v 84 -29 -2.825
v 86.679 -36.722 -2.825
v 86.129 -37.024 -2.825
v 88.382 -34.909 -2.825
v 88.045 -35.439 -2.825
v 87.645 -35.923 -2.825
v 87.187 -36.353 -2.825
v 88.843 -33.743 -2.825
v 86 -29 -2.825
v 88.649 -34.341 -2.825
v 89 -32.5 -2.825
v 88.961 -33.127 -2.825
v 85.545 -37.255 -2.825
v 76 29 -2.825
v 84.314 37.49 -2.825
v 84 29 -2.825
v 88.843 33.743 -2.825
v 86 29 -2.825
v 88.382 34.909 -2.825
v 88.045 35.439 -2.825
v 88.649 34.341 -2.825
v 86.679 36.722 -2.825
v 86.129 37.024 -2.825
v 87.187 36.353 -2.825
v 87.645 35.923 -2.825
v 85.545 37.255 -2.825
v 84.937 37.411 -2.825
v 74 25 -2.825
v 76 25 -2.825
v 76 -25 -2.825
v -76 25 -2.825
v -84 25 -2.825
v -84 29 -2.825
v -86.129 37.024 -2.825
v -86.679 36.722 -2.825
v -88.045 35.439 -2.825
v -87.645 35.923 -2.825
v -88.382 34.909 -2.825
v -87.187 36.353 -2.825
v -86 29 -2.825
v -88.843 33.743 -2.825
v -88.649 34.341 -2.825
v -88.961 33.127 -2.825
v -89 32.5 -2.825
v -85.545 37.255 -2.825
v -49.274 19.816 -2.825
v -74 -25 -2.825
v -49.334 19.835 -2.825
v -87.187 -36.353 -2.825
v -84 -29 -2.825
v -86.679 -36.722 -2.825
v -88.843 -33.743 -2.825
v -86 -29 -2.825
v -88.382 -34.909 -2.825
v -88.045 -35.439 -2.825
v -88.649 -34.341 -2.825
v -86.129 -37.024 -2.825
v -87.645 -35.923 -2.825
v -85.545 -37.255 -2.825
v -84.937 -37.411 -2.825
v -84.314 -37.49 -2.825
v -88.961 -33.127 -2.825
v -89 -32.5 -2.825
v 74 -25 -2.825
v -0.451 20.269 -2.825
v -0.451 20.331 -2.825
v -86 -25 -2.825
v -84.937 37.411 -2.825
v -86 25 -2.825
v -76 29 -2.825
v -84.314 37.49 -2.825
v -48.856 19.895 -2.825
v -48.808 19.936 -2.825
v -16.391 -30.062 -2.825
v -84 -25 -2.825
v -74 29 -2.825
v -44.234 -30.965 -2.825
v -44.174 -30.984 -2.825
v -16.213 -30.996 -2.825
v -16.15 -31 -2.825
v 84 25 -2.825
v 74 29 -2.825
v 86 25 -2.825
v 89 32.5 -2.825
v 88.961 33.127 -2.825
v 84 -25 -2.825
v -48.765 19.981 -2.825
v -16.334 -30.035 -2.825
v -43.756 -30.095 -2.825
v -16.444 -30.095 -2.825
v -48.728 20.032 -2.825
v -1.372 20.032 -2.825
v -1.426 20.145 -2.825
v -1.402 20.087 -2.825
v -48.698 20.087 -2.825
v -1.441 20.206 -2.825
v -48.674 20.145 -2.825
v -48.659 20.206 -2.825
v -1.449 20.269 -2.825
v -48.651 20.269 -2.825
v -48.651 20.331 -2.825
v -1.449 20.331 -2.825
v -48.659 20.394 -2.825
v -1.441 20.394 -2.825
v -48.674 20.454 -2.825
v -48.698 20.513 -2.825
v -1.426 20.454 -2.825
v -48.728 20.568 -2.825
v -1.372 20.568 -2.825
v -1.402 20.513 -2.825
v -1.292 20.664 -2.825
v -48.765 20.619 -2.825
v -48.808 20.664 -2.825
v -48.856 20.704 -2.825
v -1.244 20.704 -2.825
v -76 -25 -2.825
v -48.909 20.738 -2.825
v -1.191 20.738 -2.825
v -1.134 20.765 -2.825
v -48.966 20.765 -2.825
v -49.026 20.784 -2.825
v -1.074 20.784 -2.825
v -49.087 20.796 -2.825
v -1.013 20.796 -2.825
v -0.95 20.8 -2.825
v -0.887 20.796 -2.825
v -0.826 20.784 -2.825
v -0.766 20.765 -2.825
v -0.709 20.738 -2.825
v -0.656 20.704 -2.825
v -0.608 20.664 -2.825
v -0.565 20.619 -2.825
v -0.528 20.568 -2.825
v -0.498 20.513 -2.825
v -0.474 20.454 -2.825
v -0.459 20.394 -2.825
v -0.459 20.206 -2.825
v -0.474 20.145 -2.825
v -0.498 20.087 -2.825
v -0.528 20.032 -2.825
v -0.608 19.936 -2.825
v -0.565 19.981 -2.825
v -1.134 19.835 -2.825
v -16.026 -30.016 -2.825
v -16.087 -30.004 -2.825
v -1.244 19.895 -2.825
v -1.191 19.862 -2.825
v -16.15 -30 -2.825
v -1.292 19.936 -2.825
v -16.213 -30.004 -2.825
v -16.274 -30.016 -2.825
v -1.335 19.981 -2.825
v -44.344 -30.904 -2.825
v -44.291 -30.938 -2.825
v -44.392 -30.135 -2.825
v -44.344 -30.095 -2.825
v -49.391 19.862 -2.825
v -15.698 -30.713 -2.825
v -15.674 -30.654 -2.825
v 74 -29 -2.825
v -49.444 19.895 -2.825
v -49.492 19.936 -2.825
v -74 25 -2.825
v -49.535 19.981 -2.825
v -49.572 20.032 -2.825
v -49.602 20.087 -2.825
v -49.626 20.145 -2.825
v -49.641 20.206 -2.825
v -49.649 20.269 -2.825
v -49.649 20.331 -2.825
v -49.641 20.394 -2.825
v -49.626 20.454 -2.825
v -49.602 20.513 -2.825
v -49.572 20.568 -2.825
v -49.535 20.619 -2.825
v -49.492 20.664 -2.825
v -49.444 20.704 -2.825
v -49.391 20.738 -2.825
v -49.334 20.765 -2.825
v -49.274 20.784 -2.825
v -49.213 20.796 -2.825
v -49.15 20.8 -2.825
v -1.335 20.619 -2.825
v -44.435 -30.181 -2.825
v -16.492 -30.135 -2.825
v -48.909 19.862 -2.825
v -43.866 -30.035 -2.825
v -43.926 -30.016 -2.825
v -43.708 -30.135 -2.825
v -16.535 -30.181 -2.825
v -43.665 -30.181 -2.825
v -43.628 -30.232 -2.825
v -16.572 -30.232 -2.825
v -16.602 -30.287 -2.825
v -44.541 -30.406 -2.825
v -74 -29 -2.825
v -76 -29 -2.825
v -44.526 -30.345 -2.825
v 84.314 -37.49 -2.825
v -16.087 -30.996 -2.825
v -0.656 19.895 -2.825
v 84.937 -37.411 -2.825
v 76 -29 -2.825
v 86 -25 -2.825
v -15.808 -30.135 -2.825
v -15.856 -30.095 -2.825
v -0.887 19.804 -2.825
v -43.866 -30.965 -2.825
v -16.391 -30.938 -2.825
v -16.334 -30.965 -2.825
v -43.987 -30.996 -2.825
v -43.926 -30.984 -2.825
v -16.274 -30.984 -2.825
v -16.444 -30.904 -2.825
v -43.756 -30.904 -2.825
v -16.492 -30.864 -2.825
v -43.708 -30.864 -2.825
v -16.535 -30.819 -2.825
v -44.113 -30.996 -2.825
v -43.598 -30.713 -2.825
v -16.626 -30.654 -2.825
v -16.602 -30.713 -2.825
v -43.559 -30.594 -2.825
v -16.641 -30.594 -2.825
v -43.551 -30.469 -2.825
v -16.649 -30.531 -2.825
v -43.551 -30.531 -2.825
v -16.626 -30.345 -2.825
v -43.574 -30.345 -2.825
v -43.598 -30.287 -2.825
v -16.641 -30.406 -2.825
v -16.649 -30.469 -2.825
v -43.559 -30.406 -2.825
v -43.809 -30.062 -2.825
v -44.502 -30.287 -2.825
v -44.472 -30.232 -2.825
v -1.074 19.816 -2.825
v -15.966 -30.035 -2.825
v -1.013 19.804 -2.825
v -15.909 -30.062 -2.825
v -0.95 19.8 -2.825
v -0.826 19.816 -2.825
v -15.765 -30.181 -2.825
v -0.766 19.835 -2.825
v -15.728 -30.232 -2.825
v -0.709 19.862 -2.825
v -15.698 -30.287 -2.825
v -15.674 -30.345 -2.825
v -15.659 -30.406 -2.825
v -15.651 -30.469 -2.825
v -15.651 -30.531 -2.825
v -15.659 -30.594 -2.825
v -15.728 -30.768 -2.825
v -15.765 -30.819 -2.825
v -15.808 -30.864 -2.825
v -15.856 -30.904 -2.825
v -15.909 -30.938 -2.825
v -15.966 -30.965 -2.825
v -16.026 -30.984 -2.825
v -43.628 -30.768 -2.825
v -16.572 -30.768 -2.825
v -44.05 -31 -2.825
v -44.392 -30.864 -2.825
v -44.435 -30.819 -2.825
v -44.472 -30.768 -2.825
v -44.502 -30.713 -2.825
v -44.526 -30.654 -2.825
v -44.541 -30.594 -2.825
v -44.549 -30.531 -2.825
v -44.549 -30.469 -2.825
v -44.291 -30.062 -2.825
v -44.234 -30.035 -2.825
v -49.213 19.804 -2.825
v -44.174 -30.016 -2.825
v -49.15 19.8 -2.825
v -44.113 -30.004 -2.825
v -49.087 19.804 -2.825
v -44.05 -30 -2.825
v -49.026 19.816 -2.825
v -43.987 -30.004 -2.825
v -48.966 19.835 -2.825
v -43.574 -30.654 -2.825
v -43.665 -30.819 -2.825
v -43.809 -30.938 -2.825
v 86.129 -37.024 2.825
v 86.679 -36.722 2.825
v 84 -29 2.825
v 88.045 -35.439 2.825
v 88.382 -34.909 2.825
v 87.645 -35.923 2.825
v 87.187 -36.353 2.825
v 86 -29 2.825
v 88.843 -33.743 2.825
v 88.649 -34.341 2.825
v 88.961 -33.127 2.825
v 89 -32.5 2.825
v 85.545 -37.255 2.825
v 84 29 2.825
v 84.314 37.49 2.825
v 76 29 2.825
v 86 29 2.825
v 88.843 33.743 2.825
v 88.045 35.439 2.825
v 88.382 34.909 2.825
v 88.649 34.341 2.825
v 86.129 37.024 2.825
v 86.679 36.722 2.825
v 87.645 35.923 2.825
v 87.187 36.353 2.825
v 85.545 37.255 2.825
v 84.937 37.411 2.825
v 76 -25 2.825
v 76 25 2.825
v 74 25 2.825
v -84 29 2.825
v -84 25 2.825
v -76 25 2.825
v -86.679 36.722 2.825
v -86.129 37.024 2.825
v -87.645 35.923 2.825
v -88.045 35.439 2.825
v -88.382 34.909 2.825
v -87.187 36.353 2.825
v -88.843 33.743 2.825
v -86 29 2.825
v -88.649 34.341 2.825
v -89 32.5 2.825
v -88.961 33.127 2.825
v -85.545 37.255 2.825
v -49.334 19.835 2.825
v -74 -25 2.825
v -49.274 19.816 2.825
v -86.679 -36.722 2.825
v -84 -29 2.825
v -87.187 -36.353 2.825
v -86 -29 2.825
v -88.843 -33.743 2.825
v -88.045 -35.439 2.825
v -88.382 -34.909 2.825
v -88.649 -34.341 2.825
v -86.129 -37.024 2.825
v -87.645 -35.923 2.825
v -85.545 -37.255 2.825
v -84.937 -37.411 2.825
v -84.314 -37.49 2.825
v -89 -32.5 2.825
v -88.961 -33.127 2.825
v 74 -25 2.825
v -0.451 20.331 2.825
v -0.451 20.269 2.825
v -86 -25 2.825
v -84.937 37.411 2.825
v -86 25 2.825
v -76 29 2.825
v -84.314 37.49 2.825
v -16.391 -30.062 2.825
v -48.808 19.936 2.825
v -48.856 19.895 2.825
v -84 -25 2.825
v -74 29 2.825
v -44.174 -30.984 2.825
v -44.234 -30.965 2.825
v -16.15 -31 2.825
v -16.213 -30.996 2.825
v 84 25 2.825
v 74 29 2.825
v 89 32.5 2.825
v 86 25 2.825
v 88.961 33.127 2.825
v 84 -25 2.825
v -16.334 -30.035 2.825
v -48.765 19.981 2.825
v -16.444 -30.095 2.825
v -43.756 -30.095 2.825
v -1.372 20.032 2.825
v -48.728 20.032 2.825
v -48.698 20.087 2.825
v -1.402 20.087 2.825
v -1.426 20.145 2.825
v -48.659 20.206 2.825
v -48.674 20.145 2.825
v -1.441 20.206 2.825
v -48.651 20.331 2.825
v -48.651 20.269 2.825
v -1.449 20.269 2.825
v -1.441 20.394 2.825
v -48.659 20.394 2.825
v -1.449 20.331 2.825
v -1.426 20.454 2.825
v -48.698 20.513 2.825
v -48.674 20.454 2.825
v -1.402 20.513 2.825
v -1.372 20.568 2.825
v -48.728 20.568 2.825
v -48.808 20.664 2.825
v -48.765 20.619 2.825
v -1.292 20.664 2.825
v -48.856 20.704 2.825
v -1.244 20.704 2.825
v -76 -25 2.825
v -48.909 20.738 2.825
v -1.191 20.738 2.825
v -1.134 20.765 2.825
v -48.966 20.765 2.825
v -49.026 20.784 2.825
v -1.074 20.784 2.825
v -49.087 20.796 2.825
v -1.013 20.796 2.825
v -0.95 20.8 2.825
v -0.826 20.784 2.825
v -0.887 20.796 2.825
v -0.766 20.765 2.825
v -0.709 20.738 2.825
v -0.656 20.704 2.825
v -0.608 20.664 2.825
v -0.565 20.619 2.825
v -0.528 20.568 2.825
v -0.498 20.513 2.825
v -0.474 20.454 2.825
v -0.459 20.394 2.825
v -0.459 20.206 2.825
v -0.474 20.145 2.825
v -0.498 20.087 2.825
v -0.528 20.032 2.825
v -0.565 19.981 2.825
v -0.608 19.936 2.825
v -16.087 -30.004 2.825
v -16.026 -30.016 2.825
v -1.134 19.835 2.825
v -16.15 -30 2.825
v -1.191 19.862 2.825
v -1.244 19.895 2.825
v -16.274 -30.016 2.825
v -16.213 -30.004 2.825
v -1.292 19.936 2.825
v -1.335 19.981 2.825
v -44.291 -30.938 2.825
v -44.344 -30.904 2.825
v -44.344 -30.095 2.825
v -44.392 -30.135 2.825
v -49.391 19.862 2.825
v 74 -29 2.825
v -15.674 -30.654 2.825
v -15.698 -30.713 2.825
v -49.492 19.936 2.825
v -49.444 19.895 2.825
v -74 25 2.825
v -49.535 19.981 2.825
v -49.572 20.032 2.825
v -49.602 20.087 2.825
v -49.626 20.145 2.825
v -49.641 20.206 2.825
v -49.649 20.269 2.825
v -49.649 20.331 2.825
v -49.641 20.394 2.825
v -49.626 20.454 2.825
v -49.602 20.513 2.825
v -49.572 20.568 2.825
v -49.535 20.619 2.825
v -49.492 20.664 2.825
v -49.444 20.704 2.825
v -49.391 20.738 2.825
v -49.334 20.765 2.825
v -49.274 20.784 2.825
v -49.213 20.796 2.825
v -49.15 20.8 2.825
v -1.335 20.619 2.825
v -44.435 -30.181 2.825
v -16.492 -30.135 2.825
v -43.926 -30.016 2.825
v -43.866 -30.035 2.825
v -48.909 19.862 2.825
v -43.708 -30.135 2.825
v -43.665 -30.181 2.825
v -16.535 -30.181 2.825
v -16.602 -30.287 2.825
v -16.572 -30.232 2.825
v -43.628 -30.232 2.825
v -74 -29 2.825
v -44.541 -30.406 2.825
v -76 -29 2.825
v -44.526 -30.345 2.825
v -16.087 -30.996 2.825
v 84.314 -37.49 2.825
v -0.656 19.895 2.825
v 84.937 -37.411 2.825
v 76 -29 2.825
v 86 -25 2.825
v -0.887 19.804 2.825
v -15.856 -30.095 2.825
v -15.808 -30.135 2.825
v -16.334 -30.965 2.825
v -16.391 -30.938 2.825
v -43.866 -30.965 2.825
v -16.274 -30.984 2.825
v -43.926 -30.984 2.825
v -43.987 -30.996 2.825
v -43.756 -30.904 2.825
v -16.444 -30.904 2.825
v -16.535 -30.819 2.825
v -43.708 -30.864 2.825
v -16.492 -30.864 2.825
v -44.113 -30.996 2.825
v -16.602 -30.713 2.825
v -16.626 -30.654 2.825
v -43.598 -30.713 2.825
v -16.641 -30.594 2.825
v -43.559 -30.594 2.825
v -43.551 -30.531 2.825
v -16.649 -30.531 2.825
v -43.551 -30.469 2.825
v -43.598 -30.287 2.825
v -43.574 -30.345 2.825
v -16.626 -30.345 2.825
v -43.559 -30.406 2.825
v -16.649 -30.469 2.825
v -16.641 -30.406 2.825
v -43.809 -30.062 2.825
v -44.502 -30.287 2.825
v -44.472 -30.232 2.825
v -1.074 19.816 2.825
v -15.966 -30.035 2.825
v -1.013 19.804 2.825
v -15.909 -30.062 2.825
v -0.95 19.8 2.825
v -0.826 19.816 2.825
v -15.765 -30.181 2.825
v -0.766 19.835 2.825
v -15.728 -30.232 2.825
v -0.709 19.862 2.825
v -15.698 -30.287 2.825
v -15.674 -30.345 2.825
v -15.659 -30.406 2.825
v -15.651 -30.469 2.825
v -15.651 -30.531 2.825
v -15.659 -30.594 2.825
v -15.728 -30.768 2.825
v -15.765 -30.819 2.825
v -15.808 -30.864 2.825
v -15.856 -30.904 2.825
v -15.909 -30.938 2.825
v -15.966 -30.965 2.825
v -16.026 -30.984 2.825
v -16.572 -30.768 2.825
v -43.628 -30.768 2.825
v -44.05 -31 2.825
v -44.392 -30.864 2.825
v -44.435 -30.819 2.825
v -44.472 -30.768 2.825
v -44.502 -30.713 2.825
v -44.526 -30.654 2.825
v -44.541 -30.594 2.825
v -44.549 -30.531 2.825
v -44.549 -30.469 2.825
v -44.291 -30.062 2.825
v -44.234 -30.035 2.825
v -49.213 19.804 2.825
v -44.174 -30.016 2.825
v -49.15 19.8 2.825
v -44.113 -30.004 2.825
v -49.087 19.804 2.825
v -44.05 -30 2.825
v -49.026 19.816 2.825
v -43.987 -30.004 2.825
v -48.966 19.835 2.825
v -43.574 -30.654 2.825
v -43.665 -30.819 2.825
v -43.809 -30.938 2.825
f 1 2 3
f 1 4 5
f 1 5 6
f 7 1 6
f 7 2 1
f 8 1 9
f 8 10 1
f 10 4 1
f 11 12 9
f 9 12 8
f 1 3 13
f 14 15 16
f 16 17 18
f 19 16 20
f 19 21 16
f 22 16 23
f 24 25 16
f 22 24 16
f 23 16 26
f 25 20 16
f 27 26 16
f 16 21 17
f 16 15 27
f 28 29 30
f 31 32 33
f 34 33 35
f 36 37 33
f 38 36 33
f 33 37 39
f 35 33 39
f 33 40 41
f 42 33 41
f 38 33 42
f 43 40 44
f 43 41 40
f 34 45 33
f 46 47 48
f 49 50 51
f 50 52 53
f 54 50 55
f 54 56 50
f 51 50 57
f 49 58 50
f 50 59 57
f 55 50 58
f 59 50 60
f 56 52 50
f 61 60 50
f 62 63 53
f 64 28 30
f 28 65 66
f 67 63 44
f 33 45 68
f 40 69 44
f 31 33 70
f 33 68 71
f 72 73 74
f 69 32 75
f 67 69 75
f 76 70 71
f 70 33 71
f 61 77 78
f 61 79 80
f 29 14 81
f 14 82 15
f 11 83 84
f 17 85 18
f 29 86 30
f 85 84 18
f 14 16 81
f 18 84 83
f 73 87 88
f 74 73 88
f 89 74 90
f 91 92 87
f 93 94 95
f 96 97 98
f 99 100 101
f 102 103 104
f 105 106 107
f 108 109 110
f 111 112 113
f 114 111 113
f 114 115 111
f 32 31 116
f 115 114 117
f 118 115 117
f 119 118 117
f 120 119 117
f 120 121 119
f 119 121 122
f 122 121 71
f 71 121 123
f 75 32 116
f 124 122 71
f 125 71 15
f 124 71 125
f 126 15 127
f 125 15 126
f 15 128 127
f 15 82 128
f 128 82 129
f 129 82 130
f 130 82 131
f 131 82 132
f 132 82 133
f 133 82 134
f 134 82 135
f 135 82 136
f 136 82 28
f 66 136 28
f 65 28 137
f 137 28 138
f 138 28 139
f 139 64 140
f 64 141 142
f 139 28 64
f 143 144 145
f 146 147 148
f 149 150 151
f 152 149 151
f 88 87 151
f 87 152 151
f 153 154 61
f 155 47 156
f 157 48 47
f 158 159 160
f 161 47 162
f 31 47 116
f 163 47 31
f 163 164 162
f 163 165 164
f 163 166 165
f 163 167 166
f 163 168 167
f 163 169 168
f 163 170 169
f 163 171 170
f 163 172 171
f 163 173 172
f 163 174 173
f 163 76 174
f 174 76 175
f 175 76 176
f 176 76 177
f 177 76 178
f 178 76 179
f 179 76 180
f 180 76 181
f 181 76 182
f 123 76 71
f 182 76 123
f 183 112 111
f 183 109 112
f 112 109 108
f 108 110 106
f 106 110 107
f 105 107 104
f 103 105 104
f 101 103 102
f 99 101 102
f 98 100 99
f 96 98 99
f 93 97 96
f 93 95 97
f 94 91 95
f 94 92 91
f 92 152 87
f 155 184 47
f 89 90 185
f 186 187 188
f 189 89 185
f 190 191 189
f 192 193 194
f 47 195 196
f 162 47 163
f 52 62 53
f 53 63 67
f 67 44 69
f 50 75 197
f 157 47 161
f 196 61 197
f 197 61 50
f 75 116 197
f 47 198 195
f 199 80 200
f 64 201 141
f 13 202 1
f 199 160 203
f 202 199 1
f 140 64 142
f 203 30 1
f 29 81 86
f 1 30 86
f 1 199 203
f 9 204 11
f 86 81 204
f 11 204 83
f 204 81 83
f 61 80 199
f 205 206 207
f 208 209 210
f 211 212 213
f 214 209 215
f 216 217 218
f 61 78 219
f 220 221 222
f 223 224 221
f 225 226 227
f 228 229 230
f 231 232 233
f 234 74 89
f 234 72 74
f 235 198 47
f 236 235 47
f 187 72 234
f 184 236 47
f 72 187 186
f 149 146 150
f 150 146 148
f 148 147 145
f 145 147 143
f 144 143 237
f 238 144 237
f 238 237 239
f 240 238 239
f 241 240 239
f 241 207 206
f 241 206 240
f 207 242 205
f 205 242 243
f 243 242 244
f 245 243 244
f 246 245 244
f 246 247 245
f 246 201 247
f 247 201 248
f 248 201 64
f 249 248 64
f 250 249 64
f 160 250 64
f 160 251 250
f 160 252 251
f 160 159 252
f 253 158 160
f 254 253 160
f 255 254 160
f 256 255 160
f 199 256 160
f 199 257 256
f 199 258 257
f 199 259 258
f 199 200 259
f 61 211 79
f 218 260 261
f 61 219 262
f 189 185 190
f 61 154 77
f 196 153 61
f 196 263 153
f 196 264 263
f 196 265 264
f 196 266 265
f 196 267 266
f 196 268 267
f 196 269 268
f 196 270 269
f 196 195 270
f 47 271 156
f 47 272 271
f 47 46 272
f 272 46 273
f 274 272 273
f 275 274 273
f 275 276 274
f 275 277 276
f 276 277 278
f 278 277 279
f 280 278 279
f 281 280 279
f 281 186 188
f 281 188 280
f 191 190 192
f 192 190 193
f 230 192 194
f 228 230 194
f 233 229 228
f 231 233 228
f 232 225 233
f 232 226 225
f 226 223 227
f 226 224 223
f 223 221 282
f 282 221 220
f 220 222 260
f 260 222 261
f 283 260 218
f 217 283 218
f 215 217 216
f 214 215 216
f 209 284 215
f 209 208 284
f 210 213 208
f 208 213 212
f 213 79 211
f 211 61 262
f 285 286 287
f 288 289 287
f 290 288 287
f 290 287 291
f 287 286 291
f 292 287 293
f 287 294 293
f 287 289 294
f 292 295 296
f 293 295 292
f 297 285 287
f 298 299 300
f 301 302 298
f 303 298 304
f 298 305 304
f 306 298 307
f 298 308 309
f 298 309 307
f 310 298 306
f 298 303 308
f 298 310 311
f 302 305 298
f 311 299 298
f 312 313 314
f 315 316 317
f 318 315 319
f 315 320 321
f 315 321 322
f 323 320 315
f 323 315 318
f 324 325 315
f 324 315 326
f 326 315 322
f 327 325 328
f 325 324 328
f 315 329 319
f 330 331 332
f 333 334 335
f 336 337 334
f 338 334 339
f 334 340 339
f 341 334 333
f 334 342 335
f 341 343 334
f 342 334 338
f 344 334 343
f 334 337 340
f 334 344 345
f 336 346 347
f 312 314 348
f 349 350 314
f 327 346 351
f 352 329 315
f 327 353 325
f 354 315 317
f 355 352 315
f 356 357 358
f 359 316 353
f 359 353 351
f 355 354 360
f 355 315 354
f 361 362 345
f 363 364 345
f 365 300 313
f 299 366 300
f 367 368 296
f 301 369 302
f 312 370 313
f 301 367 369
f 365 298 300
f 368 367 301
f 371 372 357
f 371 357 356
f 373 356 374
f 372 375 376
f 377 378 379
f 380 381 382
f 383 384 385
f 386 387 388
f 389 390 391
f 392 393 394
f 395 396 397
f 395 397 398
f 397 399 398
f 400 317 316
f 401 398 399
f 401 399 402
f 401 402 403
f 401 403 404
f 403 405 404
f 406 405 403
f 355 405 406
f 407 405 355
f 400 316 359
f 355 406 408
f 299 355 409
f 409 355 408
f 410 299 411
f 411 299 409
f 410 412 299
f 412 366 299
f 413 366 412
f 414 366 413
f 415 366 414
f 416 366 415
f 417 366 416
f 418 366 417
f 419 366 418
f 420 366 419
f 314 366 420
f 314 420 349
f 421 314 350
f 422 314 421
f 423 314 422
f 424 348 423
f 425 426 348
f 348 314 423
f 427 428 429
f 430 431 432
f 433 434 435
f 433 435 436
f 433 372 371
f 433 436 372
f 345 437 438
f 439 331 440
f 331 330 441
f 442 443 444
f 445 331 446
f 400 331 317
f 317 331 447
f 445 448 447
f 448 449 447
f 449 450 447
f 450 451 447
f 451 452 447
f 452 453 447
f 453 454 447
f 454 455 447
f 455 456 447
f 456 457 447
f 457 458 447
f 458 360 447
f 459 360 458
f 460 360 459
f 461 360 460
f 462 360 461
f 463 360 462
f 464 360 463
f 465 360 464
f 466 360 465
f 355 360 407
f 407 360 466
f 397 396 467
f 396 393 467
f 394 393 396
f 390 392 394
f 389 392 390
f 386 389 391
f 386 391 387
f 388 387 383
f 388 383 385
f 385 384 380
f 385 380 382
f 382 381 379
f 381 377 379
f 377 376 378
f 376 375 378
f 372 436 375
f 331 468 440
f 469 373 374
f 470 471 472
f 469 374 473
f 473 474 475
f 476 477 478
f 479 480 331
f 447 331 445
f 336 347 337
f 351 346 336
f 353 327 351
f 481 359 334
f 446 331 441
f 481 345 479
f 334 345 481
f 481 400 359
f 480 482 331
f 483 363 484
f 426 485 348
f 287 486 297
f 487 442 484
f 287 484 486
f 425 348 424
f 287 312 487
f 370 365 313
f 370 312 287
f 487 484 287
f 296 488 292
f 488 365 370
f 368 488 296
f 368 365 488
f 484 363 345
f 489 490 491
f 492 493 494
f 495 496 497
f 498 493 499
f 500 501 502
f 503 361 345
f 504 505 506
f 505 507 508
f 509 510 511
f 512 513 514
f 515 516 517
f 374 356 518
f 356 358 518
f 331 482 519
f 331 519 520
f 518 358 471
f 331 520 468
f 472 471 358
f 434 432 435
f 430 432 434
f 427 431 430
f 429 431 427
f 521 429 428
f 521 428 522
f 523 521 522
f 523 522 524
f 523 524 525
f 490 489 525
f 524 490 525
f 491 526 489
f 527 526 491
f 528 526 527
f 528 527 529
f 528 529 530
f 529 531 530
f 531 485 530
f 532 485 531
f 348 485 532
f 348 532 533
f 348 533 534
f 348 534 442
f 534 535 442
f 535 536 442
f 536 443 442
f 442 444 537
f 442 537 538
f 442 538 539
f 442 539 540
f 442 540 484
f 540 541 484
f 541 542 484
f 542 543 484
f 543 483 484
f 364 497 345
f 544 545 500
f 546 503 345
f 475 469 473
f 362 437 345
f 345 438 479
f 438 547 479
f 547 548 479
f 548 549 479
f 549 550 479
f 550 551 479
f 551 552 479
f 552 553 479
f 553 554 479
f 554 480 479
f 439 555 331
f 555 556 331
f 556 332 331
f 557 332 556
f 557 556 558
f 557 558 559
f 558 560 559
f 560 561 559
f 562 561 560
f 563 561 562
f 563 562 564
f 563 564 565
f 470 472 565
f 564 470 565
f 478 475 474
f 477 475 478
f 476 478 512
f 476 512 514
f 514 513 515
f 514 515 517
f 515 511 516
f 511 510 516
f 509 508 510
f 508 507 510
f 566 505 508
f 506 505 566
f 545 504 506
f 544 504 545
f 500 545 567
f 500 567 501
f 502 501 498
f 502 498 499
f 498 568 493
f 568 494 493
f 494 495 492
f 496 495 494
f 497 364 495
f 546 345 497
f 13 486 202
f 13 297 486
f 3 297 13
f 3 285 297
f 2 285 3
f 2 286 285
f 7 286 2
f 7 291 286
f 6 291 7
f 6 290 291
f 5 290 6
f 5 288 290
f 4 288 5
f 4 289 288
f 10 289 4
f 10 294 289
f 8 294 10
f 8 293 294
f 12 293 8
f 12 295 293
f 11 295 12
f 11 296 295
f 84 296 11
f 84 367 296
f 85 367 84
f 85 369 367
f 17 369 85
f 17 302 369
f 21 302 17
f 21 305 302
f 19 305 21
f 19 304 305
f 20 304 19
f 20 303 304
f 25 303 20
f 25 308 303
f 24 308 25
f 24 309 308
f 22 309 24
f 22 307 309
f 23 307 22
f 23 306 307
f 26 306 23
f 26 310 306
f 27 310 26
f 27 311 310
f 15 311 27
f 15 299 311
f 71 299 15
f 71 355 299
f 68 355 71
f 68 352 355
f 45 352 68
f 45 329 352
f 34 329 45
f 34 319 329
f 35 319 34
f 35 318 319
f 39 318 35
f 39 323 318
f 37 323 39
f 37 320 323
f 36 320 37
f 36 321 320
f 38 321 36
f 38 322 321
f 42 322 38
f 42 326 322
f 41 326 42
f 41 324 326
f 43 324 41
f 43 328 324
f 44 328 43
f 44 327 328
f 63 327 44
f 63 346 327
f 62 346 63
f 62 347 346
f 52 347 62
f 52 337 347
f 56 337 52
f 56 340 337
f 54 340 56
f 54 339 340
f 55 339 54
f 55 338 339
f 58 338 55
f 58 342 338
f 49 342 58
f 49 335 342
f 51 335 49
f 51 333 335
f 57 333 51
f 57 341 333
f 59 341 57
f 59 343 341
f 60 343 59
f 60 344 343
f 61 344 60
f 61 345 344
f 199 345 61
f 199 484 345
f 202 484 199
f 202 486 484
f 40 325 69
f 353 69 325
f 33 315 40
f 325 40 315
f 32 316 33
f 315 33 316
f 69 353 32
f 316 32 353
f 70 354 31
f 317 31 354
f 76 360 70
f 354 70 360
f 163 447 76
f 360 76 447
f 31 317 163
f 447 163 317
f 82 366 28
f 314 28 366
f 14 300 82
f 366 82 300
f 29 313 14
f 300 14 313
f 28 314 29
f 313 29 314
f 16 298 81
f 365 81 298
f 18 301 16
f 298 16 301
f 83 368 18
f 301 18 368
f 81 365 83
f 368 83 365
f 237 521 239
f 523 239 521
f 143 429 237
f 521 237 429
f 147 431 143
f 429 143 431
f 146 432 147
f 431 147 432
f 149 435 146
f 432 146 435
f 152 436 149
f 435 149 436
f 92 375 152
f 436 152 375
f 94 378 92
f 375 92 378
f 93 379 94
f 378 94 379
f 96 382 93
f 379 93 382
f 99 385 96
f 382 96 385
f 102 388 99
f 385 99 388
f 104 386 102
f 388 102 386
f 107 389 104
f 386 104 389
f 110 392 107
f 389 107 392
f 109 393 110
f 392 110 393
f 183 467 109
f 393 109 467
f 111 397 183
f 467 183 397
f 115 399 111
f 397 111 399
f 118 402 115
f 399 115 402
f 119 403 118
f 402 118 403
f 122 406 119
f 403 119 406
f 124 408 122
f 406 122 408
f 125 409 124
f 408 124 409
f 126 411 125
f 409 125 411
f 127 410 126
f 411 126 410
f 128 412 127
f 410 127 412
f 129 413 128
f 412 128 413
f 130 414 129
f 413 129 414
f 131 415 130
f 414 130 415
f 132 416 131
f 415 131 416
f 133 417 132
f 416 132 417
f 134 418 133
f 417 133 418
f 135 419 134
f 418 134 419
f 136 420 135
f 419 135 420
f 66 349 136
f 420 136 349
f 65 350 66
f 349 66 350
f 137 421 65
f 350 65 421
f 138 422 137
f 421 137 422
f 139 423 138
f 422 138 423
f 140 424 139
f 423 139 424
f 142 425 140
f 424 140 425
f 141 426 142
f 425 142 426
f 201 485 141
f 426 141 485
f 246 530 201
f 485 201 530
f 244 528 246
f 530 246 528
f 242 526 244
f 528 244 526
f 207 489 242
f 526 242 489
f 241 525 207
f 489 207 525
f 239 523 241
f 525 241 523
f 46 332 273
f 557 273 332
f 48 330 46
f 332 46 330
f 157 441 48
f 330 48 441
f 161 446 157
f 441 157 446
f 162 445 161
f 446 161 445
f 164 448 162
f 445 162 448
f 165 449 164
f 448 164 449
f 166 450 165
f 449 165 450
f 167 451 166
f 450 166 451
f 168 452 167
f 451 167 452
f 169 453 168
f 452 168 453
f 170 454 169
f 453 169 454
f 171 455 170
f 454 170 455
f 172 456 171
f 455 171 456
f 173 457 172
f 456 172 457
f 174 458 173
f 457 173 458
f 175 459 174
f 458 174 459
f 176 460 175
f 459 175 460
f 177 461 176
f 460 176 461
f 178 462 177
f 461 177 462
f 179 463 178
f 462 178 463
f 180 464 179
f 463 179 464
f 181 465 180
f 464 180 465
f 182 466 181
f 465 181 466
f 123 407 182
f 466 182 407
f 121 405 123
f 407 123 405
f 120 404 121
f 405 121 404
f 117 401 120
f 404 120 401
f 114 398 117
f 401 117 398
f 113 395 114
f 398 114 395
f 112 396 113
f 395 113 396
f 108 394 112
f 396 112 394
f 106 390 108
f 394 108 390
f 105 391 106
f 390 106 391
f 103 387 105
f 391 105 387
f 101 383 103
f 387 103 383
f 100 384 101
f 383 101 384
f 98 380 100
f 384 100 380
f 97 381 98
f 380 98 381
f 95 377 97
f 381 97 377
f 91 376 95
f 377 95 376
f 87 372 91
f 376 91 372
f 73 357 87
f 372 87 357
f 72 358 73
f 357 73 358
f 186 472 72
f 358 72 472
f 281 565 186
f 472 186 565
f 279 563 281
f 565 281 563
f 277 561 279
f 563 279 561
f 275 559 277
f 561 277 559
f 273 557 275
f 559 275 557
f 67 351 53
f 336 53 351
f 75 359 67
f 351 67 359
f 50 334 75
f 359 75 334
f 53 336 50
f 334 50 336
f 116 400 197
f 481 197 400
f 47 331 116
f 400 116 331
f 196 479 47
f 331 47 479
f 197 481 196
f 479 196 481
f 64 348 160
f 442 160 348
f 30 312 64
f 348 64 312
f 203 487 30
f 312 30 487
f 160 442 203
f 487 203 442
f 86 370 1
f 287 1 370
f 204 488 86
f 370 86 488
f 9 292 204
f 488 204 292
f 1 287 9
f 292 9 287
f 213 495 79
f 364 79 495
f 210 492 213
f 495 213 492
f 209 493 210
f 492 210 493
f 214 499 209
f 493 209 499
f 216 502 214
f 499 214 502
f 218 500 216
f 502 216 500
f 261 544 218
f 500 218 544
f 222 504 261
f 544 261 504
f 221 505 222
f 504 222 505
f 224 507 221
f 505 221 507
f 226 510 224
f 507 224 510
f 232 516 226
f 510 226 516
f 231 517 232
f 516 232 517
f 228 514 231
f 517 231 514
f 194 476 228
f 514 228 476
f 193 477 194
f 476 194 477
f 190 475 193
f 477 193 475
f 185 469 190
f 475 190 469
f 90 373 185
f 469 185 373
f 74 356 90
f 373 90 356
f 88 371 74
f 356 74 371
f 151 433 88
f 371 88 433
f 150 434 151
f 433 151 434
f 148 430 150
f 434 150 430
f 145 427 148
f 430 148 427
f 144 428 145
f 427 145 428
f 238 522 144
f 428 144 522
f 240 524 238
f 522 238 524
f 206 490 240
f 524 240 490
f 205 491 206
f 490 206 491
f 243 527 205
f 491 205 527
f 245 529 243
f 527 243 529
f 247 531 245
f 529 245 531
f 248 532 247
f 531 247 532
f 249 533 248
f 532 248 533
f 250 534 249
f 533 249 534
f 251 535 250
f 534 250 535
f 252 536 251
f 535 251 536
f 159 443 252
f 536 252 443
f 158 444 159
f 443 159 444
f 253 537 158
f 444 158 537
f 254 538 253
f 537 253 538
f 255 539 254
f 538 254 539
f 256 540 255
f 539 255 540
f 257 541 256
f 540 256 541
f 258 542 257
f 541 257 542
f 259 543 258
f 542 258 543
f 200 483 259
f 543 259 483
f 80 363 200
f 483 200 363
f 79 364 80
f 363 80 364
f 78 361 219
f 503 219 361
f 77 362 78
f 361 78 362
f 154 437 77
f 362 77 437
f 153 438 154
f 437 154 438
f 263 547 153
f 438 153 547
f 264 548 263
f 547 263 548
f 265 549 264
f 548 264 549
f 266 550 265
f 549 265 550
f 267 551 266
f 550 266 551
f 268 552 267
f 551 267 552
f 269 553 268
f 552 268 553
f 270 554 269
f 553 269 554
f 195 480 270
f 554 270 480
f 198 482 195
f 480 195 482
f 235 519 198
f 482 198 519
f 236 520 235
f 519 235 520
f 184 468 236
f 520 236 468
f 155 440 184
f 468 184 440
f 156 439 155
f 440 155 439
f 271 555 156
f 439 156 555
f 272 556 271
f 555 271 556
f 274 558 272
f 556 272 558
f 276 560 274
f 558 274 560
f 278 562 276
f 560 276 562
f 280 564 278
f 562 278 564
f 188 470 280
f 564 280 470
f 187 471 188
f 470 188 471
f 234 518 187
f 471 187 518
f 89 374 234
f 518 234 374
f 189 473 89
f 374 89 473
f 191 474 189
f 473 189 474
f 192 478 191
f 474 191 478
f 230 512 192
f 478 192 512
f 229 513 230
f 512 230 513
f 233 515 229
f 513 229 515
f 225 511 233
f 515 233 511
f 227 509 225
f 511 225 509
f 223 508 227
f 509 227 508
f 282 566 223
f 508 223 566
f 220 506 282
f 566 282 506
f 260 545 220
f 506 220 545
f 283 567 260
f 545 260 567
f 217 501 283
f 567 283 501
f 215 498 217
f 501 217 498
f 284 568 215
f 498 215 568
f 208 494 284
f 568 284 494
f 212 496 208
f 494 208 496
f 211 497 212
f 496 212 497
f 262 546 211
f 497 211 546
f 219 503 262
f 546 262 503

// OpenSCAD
// file: formulas.scad
  
//Distance between 2 points
function distance(p1, p2) = sqrt(pow(p2[0]-p1[0], 2) + pow(p2[1]-p1[1], 2));
  
// distance between 2 arc end points
function arc_distance(r, depth) = sqrt(8*r*depth - 4*pow(depth, 2));
// file: common.scad
include <dimensions.scad>;

module strap_holes(pos=[0,0], rot=0, span=8) {
  translate(pos) rotate([0,0,rot]) {
    translate([0,-span/2]) square(strap_hole_dim, center=true);
    translate([0,span/2]) square(strap_hole_dim, center=true);
  }
}

module nema17_holes(slide) {
  shaft_d = 22;
  screw_d=3;
  s=31;

  module screwhole() {
    hull() {
     translate([-slide/2,0,0]) circle(r=screw_d/2, center=true);
     translate([slide/2,0,0]) circle(h=depth, r=screw_d/2, center=true);
    }
  }

  translate([s/2,s/2,0]) screwhole();
  translate([-s/2,s/2,0]) screwhole();
  translate([s/2,-s/2,0]) screwhole();
  translate([-s/2,-s/2,0]) screwhole();

  circle(r=shaft_d/2, center=true);
}

module endstop(pcb_base=true) {
  // End stop from Sparkfun
  offset=0.2;

  outer=18.6;
  inner=9.9;
  height=15.04;
  inner_height=12.12;
  depth=4.97;
  pcb_width=20.15;
  pcb_length=15.11;
  pcb_thickness=1.56;
  margin=1.6;

  rotate([90, 0, 0]) 
  translate([-outer/2, -(height-inner_height) -offset*3, -depth/2]) {
    color("gray")
    linear_extrude(depth + offset*2)
    offset(0.5)
    difference() {
      square([outer, height]);
      translate([(outer - inner)/2, height - inner_height]) square([inner, inner_height]);
    }
    color("red")
    translate([-(pcb_width-outer)/2, -pcb_thickness, -margin]) cube([pcb_width, pcb_thickness, pcb_length]);
  }


}

endstop();
// file: dimensions.scad
use <formulas.scad>;

$fn=50;
export_fn=100;
export_scale=0.03937; // scales down mm->inches (useful if your laser cutter uses inches)
cut_diam=0.2;

// Global
PI = 3.15159265; 


span_bottle=100; 
bottle_rod_diam=10; 
front_rod_diam=10; 
width=470;
span_bottom=160; // Bottom rods span
span_bottle=120; // Bottle rods span
board_thickness=5.65;
nut_t=6;
back_tilt_angle=20;

cable_diam=1.7;

bushings_diam=15;
bushings_length=24;
bushings_hole_length=24;

strap_hole_dim=[4, 2];
strap_margin=3;

// Bottle grip
grip_margin=11;
bottle_axle_diam=8;
bottle_axle_pos=[span_bottom-sin(back_tilt_angle)*span_bottle/2, cos(back_tilt_angle)*span_bottle/2];

bottle_grip_bottom_diam=90;
bottle_grip_bottom_height=6;
bottle_grip_bottom_cone_height=4;

bottle_grip_top_diam=50;
bottle_grip_top_height=7;
bottle_grip_top_cone_height=20;
bottle_grip_top_diam=50;
bottle_grip_top_inner_diam=45;
bottle_pulley_teeth=62;


// Sides
holes_margin=25; 
axle_position=[0,0];
break_position=[70, 50];
axis_z=40;
bearing_extrusion_height=7.2;
bearing_extrusion_length=24;
bearing_axle_length=20;
bearing_id=8;

//x_top_rod_position=[0,bottle_axle_pos[1] + x_rods_span/2];
bottom_extrusion_height=5;
bottle_top_rod_position=[span_bottom-sin(back_tilt_angle)*span_bottle, cos(back_tilt_angle)*span_bottle];

// Right wall
bottle_axis_diam=15;
stepper_slide_distance=0;
a_stepper_pos=[span_bottom*0.4, 10];
stepper_rotation=0; //atan((bottle_axle_pos[1]-a_stepper_pos[1])/(bottle_axle_pos[0]-a_stepper_pos[0]));


// Left wall

// X table
x_carriage_pos=width/5;
x_a_distance=85;
x_table_tilt=0;
x_rods_span=50;
rod_ext=8;
table_rod_ext=0;
table_rods_diam=8;

// X stepper mount
x_stepper_mount_length = 50;
x_stepper_mount_width = x_rods_span + 10;
x_stepper_mount_shift=(22-9)/2;

x_table_width=width - board_thickness*2;

// X carriage
//carriage_length= 24; // single bushing
carriage_length=65; // double bushings
carriage_height=x_rods_span+20;
carriage_rounding_radius = 5;
carriage_bushing_hole_width = 10;
z_rods_length=120;
z_rods_diam=8;
z_bar_width=20;
z_pos=40;
z_bushings_diam=15;
z_bolt_diam=3;
z_rods_span=41;
z_bushings_pos = x_rods_span/2;
solenoid_dim = [27, 22, 25];
solenoid_pos=0;
plate_distance = sqrt(pow(bushings_diam/2, 2) - pow(carriage_bushing_hole_width/2, 2)) + board_thickness/2; // Calculates plate distance (depending on carriage_bushing_hole_width
echo("Plate distance:", plate_distance*2 + board_thickness);
z_plate_dist = 5;
z_bushings_hole_width = 2*sqrt(pow(bushings_diam/2, 2) - pow(z_plate_dist, 2));
nut_guide_hole_width=10;
nut_guide_hole_length=30;
nut_guide_height=z_plate_dist*2;
nut_guide_width=20;
z_leadscrew_diam=5;
carriage_screw_diam=8;

// Calculations for x table position
xz_span = plate_distance + z_plate_dist + board_thickness/2;
x_top_rod_position=[bottle_axle_pos[0] - cos(x_table_tilt)*(x_a_distance) + sin(x_table_tilt)*(-xz_span), bottle_axle_pos[1] + sin(x_table_tilt)*(x_a_distance) + cos(x_table_tilt)*(-xz_span)];
x_btm_rod_position=[bottle_axle_pos[0] - cos(x_table_tilt)*(x_a_distance + x_rods_span) + sin(x_table_tilt)*(-xz_span), bottle_axle_pos[1] + sin(x_table_tilt)*(x_a_distance + x_rods_span) + cos(x_table_tilt)*(-xz_span)];

toolbit_mount_diam=4.8;

// Bottle
bottle_pos=40;
bottle_diam=100;
bottle_height=360;

// Bottle bar
bottle_bar_width=40;
bottle_bar_height=span_bottle;
bottle_bar_pos=bottle_height+bottle_pos+30;

bearing_hole_diam=13;
bearing_guide_diam=22;


// Pulley properties
shaftDiameter = 8; // the shaft at the center, will be subtracted from the pulley. Better be too small than too wide.
hubDiameter = 30; // if the hub or timing pulley is big enough to fit a nut, this will be embedded.
hubHeight = 8; // the hub is the thick cylinder connected to the pulley to allow a set screw to go through or as a collar for a nut.
flanges = 2; // the rims that keep the belt from going anywhere
hubSetScewDiameter = 0; // use either a set screw or nut on a shaft. Set to 0 to not use a set screw.
numSetScrews = 3;
bottle_pulley_teeth = ceil(7.1*16); // this value together with the pitch determines the pulley diameter
echo("Teeth:", bottle_pulley_teeth);

toothType = 1; // 1 = slightly rounded, 2 = oval sharp, 3 = square. For square, set the toothWith a little low.

// Belt properties:
pitch = 2; // distance between the teeth
beltWidth = 6; // the width/height of the belt. The (vertical) size of the pulley is adapted to this.
beltThickness = 0.63; // thickness of the part excluding the notch depth!
notchDepth = 0.75; // make it slightly bigger than actual, there's an outward curvature in the inner solid part of the pulley
toothWidth = 1.2; // Teeth of the PULLEY, that is.
pulleyRadius = pitch*bottle_pulley_teeth/(PI*2) - notchDepth;

a_stepper_teeth=11;
a_stepper_pulley_radius=4.2;
x_stepper_pulley_radius=4.2;


// Belt tensioner
echo(belt_tensioner_position[1], "Tensioner position");
echo(a_stepper_pulley_radius, "11t radius");
belt_tensioner_bolt_diam=7.8;
belt_tensioner_elevation=8;
belt_tensioner_stroke=10;
belt_tensioner_axle_margin=3;
belt_tensioner_xpos = 105;
belt_tensioner_position=[belt_tensioner_xpos, a_stepper_pos[1] - a_stepper_pulley_radius + (bottle_axle_pos[1] - pulleyRadius - a_stepper_pos[1] + a_stepper_pulley_radius)/(bottle_axle_pos[0] - a_stepper_pos[0])*(belt_tensioner_xpos-a_stepper_pos[0]) + belt_tensioner_stroke/2 - 22/2];

x_belt_clamp_len=21;

electronics_mount_length=70;
electronics_mount_pos=80;
arduino_hole_diam=1;
// main file
include <dimensions.scad>;
use <common.scad>;

module electronics_mount() {

  module arduino_holes() {
  translate([-68.6/2, -53.3/2]) {
    translate([14,2.5]) {
      translate([0,0]) circle(arduino_hole_diam/2);
      translate([50.8,5.1]) circle(arduino_hole_diam/2);
      translate([50.8,5.1+27.9]) circle(arduino_hole_diam/2);
      translate([0,48.2]) circle(arduino_hole_diam/2);
    }
    }
  }

  rounding=5;

  color("white")
  linear_extrude(board_thickness, center=true)
  difference() {
    minkowski() {
      circle(rounding);
      square([span_bottom-rounding + front_rod_diam/2 + bottle_rod_diam/2 + strap_margin, electronics_mount_length-rounding], center=true);
    }
    {
      translate([-25, 0]) rotate([0,0,-90]) arduino_holes();
      strap_holes(pos=[-span_bottom/2, electronics_mount_length/2 - strap_margin - rounding], rot=90, span=front_rod_diam);
      strap_holes(pos=[-span_bottom/2, -(electronics_mount_length/2 - strap_margin - rounding)], rot=90, span=front_rod_diam);
      strap_holes(pos=[span_bottom/2, electronics_mount_length/2 - strap_margin - rounding], rot=90, span=front_rod_diam);
      strap_holes(pos=[span_bottom/2, -(electronics_mount_length/2 - strap_margin - rounding)], rot=90, span=front_rod_diam);
    }
  }

  
}

electronics_mount();
